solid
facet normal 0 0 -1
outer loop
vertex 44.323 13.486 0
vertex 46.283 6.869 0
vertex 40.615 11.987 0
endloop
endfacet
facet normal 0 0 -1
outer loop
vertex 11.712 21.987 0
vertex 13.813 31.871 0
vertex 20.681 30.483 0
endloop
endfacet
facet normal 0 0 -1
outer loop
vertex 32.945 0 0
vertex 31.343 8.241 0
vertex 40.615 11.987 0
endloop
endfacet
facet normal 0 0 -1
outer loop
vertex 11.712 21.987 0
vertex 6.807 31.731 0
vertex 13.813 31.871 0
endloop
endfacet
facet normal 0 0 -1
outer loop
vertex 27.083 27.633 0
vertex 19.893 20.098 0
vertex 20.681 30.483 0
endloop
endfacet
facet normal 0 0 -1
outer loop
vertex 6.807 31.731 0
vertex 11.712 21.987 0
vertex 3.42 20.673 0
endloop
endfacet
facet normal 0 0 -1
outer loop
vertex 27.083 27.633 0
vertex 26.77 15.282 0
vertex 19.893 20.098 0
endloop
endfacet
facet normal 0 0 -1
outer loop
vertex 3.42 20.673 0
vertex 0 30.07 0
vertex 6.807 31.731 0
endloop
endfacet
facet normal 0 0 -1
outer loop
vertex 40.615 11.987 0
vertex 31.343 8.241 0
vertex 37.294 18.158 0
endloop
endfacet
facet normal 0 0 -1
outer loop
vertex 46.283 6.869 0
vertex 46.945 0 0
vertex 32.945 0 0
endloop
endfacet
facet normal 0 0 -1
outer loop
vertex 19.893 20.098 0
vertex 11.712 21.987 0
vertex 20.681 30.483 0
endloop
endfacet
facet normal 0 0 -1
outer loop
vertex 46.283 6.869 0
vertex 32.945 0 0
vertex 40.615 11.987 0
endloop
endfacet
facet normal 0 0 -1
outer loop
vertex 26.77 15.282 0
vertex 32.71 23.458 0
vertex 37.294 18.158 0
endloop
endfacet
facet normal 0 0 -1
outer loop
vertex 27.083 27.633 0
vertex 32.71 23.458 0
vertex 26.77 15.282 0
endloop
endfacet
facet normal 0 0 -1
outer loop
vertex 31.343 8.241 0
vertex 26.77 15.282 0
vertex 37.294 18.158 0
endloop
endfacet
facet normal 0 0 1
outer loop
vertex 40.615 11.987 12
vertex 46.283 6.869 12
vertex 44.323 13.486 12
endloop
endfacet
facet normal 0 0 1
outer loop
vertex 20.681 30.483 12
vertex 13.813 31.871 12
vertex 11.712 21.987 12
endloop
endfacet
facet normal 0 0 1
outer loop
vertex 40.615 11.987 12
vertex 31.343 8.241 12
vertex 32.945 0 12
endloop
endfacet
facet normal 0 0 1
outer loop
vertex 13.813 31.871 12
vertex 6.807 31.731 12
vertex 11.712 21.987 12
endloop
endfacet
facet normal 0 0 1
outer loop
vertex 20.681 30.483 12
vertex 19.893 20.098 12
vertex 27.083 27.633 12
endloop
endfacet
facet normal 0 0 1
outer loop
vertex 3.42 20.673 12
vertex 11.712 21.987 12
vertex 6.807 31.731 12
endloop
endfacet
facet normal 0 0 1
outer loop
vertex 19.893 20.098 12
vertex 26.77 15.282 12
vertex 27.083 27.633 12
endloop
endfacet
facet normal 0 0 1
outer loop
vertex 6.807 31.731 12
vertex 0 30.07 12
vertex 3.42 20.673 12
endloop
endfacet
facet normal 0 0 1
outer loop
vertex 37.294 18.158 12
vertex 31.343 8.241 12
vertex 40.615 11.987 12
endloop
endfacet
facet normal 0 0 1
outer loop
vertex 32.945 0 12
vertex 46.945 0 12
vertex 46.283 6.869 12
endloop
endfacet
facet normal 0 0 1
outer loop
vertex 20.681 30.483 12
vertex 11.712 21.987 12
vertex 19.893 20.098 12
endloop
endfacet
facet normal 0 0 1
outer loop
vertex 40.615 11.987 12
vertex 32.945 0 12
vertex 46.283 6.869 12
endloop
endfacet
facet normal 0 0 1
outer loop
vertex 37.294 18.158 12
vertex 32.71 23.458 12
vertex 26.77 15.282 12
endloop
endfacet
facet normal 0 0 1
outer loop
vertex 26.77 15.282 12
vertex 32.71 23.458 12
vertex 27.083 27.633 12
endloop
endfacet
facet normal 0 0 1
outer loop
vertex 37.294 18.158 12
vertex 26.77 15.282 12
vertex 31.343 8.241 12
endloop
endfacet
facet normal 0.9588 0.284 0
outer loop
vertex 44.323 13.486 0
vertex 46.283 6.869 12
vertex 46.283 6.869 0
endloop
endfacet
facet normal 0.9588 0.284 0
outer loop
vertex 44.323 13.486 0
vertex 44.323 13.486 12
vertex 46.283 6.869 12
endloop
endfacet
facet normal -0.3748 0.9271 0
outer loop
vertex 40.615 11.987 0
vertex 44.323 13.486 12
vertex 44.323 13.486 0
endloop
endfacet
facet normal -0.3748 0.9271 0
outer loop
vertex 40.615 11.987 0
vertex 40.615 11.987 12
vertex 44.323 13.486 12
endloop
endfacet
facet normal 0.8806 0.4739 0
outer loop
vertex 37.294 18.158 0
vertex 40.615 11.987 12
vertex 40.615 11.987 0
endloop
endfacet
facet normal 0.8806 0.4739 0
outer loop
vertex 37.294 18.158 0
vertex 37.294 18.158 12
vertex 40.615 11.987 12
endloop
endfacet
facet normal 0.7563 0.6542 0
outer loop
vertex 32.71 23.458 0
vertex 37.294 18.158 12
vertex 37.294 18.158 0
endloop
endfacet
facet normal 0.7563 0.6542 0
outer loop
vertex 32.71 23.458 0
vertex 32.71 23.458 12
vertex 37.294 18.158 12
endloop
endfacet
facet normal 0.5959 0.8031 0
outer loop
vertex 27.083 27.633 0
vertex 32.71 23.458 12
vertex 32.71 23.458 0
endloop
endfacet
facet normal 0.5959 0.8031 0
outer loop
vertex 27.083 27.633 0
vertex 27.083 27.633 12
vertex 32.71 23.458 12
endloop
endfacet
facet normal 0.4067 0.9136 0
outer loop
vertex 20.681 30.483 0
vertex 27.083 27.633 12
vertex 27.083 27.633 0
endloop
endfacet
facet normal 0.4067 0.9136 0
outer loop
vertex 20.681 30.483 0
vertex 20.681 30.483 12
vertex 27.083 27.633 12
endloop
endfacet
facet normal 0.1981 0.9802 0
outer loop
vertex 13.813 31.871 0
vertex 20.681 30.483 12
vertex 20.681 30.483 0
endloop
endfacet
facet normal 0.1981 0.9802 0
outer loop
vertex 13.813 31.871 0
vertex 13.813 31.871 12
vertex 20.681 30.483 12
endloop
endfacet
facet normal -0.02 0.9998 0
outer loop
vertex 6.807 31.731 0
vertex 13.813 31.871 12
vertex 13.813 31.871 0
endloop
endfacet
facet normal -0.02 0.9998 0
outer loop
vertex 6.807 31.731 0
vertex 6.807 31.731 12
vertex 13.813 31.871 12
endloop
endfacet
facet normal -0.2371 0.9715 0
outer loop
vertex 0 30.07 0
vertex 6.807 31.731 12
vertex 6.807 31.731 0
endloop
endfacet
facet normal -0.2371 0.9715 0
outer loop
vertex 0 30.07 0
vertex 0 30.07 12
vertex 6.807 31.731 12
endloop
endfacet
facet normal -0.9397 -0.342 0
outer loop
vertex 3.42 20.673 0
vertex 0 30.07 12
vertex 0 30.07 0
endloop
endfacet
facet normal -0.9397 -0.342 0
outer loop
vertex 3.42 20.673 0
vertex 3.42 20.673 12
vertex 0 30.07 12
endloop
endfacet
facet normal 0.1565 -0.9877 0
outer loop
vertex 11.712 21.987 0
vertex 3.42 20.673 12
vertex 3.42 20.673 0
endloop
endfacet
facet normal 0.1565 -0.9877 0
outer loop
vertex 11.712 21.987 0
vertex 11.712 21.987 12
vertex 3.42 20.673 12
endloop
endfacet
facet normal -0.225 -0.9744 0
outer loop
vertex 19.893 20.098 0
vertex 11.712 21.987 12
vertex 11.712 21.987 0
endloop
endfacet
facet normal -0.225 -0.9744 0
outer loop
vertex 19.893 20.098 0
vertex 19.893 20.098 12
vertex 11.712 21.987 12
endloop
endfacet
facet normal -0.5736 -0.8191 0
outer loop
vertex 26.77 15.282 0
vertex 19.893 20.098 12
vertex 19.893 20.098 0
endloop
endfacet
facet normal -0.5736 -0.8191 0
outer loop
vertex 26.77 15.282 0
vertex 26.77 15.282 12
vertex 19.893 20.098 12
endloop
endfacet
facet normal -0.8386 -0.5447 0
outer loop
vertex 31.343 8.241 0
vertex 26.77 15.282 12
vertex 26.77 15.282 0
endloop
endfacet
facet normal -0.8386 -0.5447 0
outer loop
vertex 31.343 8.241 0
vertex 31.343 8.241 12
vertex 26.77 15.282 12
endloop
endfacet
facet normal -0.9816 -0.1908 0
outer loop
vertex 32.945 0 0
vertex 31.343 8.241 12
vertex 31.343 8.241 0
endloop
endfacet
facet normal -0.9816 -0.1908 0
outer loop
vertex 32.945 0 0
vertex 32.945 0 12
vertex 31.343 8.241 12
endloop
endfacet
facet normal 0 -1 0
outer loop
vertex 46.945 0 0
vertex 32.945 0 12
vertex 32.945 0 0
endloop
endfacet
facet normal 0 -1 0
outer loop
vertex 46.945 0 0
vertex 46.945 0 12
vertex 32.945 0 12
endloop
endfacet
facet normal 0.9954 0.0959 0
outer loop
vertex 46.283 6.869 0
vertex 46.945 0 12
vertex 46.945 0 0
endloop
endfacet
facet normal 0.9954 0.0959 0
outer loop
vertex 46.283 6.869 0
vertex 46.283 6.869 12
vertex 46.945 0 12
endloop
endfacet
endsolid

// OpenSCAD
$fn = 32;

// ----------------------------------------------------------------------
// Arc stop: segment, 12 mm thick
// ----------------------------------------------------------------------

// --- parameters (mm) ---
profile_height = 12;      // extrusion height
profile_points = 17;      // points of the closed outline

profile = [[46.945, 0], [46.283, 6.869], [44.323, 13.486], [40.615, 11.987], [37.294, 18.158], [32.71, 23.458], [27.083, 27.633], [20.681, 30.483], [13.813, 31.871], [6.807, 31.731], [0, 30.07], [3.42, 20.673], [11.712, 21.987], [19.893, 20.098], [26.77, 15.282], [31.343, 8.241], [32.945, 0]];  // single closed polygon, 17 points, counter clockwise

// --- the one profile operation ---
linear_extrude(height = profile_height) polygon(points = profile);
